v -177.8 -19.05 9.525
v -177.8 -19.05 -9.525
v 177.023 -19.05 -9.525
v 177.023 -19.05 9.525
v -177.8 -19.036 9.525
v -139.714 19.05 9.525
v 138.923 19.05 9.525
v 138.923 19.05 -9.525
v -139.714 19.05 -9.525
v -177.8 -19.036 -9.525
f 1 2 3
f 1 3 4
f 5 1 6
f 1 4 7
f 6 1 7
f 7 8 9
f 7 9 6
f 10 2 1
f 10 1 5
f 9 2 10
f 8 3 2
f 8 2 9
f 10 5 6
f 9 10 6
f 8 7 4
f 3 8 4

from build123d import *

# Parameters (mm, degrees)
F0_W     = 38.1
F0_H     = 19.05
F1_DEPTH = 177.8
F4_DEPTH = 50.8
F6_DEPTH = 50.8


with BuildPart() as f1:
    # F0 (on Right) → F1 (new body, symmetric)
    with BuildSketch(Plane.YZ):
        Rectangle(F0_W, F0_H)
    extrude(amount=F1_DEPTH, both=True)

    # F3 (on face) → F4 (cut)
    with BuildSketch(Plane.XY.offset(9.525)):
        Polygon((-177.8, 19.05), (-177.8, -19.0363529205), (-139.7136470795, 19.05), align=None)
    extrude(amount=-F4_DEPTH, mode=Mode.SUBTRACT)

    # F5 (on face) → F6 (cut)
    with BuildSketch(Plane.XY.offset(9.525)):
        Polygon((138.9227120697, 19.05), (177.0227120697, -19.05), (177.8, -19.05), (177.8, 19.05), align=None)
    extrude(amount=-F6_DEPTH, mode=Mode.SUBTRACT)


solid = f1.part
